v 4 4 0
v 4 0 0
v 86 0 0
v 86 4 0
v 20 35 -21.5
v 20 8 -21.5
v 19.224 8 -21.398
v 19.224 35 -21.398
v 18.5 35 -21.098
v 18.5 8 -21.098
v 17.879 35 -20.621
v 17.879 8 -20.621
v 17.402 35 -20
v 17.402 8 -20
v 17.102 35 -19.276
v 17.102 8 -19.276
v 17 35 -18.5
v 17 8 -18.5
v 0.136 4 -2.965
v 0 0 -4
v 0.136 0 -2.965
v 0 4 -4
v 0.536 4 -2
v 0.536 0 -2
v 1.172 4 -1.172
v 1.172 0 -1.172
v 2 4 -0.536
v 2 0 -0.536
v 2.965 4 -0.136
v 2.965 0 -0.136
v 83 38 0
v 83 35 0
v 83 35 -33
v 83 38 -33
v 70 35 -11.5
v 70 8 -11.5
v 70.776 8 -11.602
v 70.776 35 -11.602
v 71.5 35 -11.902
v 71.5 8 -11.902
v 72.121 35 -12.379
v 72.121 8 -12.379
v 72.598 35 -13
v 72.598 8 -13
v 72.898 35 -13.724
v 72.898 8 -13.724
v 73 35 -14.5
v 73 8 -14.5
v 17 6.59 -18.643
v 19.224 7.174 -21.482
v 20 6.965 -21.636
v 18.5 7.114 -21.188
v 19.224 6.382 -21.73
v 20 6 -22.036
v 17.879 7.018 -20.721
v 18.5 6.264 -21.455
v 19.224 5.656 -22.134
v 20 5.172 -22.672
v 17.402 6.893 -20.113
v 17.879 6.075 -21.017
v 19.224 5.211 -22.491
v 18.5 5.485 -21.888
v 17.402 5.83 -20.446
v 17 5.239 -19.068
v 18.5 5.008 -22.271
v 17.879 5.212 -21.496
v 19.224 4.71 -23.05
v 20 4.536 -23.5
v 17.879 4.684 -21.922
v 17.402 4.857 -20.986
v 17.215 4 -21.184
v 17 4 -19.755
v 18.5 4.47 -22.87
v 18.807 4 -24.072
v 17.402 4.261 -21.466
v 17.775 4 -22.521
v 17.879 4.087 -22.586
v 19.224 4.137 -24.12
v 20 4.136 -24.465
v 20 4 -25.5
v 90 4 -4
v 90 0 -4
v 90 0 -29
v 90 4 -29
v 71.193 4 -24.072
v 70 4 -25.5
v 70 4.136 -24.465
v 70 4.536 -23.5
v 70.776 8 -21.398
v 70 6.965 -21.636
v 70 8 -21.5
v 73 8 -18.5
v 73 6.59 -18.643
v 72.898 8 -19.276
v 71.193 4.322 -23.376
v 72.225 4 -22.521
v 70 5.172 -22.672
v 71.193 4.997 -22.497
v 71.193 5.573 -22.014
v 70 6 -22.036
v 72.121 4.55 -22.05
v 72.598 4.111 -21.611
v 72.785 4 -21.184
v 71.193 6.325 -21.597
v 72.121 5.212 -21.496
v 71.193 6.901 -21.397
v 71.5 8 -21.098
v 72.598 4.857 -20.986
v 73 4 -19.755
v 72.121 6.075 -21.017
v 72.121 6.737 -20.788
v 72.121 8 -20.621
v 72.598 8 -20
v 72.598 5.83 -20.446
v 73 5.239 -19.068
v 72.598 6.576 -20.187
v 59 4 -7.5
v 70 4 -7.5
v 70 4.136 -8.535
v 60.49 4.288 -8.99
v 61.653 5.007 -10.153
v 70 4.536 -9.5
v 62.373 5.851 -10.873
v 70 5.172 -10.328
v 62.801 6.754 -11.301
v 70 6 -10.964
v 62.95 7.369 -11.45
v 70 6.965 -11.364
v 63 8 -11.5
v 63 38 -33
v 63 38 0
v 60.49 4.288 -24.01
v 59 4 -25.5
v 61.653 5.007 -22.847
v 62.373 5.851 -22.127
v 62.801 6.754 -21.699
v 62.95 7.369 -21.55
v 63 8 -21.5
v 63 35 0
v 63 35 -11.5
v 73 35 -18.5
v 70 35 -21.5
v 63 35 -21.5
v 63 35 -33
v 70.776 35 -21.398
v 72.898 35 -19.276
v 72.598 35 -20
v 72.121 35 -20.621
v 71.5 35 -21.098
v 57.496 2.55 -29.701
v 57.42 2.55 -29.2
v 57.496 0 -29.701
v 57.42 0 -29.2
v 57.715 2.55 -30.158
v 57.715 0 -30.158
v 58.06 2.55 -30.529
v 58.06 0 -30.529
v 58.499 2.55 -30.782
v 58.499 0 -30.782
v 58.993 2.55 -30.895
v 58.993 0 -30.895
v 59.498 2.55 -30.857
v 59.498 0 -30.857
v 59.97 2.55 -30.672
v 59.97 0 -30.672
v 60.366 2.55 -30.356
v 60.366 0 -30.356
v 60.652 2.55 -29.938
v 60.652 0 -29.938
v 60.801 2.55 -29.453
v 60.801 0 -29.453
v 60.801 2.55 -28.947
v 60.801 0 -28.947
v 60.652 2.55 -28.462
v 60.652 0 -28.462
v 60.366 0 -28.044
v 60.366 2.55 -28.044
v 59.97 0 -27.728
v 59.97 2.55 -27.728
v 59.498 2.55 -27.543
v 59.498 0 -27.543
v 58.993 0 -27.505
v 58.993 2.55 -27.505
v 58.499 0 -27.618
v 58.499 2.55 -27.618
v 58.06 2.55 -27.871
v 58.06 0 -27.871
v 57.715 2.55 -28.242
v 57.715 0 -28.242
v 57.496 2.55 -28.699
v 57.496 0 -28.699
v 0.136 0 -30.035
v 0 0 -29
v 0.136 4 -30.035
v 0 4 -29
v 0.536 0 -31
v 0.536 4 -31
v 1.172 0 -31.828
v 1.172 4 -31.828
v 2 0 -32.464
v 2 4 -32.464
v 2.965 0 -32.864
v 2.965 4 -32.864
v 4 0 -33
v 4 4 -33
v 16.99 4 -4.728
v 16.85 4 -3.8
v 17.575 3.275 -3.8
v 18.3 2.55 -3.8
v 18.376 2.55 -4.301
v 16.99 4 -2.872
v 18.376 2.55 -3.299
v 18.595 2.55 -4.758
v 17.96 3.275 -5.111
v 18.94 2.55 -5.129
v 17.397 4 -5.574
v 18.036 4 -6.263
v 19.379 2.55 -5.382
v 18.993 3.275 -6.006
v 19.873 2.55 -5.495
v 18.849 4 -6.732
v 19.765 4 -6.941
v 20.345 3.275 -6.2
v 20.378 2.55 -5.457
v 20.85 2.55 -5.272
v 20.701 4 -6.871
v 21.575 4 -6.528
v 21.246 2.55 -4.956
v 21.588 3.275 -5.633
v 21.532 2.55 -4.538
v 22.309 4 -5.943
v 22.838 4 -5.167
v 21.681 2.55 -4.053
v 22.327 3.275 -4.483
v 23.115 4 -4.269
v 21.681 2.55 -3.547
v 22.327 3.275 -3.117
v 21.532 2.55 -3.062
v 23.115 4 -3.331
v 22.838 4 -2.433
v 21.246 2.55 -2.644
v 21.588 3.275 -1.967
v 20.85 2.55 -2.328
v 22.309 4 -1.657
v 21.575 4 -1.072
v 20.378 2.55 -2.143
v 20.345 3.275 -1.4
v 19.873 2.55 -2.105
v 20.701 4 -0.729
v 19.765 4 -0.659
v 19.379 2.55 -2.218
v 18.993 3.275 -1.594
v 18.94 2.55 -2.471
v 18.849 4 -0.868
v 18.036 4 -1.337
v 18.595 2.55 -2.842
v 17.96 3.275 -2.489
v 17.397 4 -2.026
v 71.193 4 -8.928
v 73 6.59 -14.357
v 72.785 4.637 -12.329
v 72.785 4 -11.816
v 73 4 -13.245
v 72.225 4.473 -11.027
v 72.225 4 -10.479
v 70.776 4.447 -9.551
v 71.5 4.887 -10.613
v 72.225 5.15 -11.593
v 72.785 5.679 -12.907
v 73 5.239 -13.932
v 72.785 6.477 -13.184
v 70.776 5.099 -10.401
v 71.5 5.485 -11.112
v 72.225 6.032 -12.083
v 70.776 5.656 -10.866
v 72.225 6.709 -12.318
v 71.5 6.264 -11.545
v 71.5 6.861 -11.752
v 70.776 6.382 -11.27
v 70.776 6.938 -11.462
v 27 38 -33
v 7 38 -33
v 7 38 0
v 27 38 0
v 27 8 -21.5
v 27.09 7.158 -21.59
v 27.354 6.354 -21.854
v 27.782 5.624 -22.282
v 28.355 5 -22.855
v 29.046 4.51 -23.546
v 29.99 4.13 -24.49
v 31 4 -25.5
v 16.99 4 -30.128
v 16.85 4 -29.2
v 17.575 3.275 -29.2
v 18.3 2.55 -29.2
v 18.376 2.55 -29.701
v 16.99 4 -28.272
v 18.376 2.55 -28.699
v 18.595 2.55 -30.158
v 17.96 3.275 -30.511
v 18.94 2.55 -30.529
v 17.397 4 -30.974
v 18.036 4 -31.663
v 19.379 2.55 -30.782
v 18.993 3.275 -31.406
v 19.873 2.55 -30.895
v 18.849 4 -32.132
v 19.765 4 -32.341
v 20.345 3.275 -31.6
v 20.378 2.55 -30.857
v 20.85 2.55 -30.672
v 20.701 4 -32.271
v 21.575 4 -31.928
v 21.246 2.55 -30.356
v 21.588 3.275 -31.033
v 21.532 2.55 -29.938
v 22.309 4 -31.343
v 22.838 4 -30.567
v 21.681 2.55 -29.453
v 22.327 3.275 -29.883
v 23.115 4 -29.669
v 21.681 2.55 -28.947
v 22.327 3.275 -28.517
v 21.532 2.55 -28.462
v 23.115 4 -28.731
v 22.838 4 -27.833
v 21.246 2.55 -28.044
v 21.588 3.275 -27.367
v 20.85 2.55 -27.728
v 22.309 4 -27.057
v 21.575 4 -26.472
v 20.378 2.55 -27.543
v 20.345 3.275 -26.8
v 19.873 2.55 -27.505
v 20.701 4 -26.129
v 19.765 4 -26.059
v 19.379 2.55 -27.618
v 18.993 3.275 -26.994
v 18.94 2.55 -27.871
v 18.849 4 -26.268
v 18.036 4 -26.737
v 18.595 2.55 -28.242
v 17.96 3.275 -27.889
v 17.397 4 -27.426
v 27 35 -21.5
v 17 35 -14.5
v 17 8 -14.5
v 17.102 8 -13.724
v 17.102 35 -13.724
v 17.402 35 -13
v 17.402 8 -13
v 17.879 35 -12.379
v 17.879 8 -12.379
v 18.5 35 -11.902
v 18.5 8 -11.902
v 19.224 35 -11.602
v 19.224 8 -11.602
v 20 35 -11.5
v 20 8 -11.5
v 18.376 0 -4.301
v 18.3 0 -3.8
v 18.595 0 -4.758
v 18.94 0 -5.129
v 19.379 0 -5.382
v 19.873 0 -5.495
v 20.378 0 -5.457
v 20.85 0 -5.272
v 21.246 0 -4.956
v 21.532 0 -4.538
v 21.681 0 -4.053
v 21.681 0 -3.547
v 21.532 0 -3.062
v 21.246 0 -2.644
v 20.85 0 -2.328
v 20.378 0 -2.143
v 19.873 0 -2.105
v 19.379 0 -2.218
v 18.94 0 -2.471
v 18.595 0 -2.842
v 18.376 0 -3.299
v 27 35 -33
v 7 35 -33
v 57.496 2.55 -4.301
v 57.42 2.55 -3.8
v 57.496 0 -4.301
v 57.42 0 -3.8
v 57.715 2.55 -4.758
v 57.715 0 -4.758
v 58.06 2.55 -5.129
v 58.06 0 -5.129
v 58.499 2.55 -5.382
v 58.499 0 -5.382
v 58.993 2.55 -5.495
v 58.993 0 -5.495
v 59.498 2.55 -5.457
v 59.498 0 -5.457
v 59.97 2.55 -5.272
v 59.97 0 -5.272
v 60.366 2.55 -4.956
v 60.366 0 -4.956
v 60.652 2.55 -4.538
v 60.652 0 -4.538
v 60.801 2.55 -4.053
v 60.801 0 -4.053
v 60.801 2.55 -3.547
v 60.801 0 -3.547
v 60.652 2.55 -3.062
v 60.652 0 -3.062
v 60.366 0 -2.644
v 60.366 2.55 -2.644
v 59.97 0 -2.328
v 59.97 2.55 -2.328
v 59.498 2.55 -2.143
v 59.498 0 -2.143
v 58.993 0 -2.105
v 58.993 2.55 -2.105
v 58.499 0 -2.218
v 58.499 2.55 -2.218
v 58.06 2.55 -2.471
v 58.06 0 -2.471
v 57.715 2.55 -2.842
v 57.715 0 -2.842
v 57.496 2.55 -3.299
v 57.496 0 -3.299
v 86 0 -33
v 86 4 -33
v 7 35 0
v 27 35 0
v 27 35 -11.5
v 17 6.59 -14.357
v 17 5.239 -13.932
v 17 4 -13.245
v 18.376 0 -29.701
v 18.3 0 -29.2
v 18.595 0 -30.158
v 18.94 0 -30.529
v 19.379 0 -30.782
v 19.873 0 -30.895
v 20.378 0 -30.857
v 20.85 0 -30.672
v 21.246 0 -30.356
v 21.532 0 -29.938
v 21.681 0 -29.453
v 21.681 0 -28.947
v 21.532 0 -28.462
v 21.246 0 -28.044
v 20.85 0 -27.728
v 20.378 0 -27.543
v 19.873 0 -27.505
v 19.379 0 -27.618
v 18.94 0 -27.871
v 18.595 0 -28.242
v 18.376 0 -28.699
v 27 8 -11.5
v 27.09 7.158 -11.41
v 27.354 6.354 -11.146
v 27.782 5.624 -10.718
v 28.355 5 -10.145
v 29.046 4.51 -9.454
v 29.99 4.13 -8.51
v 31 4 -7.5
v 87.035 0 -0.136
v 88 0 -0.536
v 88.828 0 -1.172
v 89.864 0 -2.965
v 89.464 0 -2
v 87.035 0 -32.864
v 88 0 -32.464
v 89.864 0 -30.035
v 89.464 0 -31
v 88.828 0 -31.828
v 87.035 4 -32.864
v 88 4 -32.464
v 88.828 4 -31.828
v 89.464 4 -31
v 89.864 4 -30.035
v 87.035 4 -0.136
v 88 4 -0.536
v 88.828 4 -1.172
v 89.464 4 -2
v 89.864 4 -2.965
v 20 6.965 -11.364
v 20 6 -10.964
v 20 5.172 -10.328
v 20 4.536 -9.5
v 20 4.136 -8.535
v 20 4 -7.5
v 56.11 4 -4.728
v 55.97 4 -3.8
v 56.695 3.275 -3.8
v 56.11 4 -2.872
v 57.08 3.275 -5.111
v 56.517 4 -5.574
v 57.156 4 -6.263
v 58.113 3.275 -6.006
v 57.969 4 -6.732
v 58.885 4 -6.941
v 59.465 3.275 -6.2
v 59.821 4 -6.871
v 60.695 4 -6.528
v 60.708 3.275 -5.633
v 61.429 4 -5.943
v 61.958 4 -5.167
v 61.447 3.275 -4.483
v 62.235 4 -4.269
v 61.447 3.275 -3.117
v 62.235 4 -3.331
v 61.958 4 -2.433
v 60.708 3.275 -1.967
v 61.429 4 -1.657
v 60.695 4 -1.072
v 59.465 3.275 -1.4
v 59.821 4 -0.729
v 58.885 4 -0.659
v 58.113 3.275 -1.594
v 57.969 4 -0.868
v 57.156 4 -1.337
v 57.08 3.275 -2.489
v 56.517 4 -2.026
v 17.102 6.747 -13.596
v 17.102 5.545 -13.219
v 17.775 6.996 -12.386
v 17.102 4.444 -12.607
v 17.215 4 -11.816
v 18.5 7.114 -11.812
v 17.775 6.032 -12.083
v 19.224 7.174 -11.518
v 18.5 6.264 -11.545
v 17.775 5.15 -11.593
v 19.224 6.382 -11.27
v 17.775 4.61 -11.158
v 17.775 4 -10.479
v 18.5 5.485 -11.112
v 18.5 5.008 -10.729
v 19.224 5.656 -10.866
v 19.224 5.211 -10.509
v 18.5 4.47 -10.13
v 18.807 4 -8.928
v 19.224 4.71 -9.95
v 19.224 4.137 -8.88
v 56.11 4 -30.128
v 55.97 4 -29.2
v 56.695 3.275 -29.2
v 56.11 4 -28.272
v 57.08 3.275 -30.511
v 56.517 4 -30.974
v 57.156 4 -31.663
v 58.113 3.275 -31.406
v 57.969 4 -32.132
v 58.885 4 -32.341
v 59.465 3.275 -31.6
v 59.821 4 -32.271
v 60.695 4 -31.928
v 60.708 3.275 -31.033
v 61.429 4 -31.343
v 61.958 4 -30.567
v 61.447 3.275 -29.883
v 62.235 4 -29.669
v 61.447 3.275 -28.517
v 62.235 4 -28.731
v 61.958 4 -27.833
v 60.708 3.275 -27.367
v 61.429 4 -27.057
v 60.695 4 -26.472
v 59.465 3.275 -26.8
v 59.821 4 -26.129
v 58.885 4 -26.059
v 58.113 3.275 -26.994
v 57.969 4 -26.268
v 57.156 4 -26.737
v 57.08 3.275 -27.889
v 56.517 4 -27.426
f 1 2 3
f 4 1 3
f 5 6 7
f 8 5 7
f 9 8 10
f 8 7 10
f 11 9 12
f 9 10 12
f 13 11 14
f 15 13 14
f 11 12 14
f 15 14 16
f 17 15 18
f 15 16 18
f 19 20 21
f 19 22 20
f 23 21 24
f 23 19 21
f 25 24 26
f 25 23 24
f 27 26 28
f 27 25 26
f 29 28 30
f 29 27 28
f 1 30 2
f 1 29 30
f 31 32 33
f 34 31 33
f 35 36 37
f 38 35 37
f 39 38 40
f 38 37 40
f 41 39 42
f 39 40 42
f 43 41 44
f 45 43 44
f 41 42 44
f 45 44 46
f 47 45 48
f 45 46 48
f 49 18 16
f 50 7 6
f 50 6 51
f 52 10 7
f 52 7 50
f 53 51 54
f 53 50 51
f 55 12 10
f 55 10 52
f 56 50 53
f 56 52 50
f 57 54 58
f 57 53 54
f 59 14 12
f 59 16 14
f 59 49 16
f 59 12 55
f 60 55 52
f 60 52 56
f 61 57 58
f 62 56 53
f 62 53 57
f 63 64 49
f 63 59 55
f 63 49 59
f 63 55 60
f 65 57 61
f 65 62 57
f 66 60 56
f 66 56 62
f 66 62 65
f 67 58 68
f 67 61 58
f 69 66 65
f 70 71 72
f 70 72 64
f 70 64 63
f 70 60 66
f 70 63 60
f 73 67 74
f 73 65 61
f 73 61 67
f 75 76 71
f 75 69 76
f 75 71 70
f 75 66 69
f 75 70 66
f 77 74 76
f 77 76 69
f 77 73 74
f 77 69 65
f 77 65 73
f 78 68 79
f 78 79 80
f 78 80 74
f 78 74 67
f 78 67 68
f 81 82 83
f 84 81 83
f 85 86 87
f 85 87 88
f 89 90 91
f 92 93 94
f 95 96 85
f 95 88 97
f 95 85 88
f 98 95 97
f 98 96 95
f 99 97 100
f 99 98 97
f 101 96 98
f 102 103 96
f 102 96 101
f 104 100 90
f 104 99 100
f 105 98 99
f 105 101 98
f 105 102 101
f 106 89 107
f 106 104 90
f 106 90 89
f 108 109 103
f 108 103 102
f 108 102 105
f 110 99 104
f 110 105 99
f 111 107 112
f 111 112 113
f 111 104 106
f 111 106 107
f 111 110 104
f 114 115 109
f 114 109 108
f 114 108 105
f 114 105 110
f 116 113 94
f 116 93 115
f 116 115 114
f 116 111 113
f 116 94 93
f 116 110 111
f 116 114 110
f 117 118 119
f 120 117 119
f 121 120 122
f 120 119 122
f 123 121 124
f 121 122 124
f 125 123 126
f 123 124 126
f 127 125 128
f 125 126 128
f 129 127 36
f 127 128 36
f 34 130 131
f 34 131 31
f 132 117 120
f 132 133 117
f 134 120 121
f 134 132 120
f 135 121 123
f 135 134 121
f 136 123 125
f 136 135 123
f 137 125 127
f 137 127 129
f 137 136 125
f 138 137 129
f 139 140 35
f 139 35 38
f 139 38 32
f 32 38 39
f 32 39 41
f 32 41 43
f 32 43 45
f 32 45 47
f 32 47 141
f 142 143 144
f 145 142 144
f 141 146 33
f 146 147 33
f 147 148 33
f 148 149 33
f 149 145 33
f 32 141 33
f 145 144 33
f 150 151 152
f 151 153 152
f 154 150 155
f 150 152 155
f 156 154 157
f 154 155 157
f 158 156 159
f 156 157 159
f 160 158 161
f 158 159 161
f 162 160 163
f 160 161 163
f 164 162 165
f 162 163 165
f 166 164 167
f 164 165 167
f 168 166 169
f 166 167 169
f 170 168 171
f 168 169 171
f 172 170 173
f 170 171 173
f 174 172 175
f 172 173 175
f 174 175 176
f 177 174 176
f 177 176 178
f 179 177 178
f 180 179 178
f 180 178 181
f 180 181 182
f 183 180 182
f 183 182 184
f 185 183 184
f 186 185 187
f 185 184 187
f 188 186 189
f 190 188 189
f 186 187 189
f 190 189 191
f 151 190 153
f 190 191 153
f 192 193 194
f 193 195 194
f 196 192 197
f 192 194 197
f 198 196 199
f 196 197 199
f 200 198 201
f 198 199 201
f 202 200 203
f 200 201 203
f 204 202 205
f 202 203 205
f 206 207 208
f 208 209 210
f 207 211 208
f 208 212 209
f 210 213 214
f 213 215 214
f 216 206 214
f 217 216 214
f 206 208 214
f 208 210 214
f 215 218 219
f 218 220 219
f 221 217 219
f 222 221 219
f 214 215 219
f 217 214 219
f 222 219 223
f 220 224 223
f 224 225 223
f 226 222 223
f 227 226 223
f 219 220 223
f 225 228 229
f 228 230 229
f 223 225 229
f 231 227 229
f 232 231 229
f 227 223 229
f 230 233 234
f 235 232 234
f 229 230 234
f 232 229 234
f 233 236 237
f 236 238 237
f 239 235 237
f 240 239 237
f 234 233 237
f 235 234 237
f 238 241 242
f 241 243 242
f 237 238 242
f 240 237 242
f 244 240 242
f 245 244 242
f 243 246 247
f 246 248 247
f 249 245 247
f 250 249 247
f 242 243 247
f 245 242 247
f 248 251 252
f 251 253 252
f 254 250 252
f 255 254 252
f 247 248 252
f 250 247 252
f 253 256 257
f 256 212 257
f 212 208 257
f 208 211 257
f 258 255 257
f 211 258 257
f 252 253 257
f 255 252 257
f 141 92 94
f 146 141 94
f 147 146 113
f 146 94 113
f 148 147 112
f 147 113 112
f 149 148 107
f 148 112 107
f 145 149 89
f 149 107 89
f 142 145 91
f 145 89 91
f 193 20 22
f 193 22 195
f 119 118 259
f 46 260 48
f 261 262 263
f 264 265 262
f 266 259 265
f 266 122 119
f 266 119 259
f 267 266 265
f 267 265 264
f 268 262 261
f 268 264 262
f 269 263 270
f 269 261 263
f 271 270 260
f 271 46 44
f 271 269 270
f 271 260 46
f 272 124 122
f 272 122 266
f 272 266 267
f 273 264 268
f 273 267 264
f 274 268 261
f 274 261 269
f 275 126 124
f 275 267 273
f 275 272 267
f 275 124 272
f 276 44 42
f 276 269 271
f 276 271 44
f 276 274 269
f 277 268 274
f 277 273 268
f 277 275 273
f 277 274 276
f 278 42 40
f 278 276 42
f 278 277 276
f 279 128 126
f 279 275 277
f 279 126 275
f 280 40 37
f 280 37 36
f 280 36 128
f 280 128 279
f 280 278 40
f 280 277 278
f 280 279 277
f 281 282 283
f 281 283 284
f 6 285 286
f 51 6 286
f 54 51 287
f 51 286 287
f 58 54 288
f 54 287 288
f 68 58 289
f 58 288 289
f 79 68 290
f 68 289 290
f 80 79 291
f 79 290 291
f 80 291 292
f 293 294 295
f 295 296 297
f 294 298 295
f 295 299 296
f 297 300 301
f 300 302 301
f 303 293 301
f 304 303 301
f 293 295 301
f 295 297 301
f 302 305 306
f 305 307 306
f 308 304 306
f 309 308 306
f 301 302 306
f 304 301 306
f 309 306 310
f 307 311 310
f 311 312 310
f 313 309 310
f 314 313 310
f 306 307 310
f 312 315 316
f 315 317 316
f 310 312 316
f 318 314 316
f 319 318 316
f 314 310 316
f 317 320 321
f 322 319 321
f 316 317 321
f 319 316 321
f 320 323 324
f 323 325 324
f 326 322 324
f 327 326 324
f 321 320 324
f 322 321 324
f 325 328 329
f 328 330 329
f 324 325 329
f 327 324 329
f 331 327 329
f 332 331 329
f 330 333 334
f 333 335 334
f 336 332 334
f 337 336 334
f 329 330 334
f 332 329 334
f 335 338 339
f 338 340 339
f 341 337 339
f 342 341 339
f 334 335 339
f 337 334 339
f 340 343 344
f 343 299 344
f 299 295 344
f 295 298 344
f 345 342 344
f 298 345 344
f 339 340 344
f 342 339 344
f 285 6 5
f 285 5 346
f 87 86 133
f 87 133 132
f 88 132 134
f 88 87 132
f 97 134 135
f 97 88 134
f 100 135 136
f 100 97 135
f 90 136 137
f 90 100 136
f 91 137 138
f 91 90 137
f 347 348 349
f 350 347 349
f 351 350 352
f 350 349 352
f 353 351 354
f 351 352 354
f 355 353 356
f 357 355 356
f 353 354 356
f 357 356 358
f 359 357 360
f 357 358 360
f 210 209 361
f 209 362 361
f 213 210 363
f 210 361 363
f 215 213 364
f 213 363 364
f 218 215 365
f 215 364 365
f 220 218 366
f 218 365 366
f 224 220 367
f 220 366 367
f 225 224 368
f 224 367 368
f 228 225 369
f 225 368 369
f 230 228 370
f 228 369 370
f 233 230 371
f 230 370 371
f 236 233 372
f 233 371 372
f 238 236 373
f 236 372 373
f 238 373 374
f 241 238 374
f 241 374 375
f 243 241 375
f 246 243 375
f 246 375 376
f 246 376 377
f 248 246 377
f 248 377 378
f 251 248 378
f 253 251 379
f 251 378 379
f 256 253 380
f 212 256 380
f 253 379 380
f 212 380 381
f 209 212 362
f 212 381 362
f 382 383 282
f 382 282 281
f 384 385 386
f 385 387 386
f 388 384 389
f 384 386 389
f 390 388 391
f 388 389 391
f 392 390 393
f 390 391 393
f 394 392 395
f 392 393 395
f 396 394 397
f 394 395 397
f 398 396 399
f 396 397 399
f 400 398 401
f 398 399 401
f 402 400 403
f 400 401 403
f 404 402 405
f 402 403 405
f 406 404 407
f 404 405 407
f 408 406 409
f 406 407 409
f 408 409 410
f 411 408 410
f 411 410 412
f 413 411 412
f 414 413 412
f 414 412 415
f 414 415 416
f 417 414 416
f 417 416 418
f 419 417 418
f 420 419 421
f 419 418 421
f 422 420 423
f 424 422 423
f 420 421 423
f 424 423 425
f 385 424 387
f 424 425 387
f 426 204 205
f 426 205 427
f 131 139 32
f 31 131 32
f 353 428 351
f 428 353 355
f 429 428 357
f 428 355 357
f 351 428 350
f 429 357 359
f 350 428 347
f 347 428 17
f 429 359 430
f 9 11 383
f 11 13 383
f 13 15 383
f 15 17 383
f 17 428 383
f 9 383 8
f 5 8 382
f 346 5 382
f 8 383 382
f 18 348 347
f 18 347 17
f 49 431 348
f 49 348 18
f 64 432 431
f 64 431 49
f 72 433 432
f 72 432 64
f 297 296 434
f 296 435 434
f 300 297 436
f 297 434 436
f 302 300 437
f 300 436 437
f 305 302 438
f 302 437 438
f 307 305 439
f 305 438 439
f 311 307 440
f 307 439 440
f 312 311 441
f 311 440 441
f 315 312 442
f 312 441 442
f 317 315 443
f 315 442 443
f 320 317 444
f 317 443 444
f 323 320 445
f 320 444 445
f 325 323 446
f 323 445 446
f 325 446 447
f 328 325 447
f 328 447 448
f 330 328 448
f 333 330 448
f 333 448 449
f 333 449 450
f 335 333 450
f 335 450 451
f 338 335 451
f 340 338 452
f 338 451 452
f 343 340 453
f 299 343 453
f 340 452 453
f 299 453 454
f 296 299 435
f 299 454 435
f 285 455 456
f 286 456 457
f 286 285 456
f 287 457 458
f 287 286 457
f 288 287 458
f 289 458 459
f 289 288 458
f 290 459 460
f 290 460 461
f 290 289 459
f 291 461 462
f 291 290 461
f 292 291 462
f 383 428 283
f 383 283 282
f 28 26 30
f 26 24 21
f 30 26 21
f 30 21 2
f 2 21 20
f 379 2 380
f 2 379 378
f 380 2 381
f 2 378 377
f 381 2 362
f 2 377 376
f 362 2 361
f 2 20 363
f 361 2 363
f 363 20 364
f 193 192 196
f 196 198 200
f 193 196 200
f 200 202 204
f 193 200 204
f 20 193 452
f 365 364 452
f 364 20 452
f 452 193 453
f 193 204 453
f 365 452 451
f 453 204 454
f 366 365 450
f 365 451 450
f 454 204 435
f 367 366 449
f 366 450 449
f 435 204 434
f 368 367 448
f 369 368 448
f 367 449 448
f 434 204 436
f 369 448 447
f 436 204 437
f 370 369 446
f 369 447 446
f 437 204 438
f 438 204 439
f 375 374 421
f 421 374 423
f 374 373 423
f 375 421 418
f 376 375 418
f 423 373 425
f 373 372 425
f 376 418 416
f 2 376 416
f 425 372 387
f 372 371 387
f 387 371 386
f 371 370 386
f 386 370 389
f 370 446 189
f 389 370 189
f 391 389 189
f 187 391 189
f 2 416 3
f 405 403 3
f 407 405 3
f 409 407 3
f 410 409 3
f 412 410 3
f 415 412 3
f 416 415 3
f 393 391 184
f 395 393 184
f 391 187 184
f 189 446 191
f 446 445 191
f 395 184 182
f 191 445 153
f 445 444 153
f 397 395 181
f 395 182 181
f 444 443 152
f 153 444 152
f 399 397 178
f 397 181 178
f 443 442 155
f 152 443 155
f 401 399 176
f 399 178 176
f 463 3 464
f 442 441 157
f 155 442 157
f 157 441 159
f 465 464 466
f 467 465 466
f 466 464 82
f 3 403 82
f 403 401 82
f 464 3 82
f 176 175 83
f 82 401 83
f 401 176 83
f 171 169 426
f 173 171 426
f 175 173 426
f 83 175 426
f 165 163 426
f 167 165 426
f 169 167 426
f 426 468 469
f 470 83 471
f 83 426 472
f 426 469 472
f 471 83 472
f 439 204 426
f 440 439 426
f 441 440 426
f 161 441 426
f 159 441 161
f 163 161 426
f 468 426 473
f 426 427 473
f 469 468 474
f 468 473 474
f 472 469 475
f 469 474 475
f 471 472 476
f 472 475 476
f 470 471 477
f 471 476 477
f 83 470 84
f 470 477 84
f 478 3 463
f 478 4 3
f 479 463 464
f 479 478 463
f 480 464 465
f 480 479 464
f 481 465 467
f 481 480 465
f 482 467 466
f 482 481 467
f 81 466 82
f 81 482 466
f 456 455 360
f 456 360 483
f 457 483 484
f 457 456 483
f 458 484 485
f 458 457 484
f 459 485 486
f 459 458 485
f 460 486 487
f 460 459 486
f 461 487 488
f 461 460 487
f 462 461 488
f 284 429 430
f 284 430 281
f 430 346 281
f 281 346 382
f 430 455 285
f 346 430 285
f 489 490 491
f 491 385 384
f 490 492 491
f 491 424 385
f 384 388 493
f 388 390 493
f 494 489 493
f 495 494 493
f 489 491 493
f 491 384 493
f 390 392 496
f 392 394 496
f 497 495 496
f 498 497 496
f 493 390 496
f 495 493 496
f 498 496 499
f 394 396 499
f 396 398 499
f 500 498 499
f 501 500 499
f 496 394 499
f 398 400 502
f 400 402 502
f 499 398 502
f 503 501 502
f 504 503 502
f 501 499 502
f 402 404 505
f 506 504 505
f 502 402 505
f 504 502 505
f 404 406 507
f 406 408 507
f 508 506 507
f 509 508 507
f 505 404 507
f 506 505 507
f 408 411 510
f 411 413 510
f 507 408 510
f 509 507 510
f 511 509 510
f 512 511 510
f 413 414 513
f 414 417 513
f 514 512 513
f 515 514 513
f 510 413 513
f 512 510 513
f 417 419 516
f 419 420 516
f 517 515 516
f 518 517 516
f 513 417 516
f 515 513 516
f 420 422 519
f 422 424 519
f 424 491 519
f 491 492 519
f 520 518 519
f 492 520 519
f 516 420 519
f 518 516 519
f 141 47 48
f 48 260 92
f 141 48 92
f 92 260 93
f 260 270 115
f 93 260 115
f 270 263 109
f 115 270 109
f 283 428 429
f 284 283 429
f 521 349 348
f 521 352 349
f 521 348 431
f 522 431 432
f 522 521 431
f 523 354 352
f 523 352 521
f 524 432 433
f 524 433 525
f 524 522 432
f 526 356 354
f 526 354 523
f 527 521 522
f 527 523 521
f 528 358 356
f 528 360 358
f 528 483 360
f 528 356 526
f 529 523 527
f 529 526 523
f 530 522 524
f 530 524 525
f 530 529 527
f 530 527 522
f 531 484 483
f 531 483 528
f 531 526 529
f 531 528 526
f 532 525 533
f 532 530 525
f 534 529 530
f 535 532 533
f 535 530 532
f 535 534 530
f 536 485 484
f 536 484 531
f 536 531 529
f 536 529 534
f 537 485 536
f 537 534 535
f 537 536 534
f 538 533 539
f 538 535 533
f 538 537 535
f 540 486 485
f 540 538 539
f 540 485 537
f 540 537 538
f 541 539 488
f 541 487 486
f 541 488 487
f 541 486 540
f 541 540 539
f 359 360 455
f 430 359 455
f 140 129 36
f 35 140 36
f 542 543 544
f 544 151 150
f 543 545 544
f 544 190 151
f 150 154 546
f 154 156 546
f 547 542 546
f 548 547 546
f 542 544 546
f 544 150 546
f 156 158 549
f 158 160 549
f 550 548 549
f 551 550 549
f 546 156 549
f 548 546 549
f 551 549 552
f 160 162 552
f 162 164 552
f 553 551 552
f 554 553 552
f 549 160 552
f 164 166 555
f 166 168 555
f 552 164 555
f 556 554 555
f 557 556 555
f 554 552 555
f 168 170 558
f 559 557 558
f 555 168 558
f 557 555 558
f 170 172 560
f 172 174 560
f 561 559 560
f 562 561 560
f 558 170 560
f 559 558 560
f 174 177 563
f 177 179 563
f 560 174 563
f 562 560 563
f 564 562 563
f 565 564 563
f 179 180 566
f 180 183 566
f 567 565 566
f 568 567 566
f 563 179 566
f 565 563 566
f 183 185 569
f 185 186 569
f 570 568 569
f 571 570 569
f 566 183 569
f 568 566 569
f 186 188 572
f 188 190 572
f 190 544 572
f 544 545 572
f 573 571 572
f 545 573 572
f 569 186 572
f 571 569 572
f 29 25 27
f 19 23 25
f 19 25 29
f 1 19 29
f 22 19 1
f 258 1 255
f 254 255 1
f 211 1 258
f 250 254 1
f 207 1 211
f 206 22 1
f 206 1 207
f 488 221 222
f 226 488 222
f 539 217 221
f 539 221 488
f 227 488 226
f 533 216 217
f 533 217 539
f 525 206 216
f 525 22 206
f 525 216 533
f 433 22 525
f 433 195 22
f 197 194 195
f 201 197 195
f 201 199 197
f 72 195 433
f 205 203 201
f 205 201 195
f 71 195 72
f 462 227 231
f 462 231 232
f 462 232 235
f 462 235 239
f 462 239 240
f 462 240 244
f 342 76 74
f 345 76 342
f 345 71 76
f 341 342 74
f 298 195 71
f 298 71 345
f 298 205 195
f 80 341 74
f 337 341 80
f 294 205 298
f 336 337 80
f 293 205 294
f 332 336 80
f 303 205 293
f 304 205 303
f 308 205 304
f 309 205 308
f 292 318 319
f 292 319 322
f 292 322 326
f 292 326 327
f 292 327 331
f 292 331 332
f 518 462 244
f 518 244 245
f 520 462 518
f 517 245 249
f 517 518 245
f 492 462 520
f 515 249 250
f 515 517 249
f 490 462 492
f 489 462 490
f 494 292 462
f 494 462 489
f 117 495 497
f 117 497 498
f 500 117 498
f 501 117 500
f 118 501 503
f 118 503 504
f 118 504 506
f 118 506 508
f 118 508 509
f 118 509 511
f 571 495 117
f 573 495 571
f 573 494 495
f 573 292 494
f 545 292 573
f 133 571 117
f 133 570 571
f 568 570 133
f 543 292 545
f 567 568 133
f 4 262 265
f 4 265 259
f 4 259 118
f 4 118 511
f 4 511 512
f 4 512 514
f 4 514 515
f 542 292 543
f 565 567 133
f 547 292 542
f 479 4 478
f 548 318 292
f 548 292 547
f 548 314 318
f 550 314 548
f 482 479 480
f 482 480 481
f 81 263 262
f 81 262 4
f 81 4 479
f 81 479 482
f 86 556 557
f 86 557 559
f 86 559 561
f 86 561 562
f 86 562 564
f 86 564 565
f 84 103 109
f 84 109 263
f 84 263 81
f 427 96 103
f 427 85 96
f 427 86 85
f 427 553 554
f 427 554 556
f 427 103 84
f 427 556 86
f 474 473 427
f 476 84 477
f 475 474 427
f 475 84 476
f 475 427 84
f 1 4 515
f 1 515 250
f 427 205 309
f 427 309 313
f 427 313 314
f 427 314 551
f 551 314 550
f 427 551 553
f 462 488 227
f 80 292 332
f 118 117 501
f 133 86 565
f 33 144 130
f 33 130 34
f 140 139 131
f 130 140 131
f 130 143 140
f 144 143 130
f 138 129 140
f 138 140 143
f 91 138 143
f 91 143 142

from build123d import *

# Parameters (mm, degrees)
ESQUISSE1_W                                    = 90
ESQUISSE1_H                                    = 33
BOSS_EXTRU_1_DEPTH                             = 4
ESQUISSE2_R                                    = 1.5
ENL_V_MAT_EXTRU_1_DEPTH                        = 4
ESQUISSE3_W                                    = 10
ESQUISSE3_H                                    = 10
BOSS_EXTRU_2_DEPTH                             = 31
ESQUISSE4_W                                    = 20
ESQUISSE4_H                                    = 33
BOSS_EXTRU_3_DEPTH                             = 3
CONG_1_R                                       = 4
FRAISAGE_POUR_VIS_T_TE_FRAIS_E_M31_D           = 3.4
FRAISAGE_POUR_VIS_T_TE_FRAIS_E_M31_DEPTH       = 10
FRAISAGE_POUR_VIS_T_TE_FRAIS_E_M31_CSINK_D     = 6.3
FRAISAGE_POUR_VIS_T_TE_FRAIS_E_M31_CSINK_ANGLE = 90
FRAISAGE_POUR_VIS_T_TE_FRAIS_E_M31_TIP         = 1.021463052
CONG_2_R                                       = 3


with BuildPart() as part:
    # Esquisse1 → Boss.-Extru.1 (new body)
    with BuildSketch(Plane(origin=(0, 0, 0), x_dir=(1, 0, 0), z_dir=(0, 1, 0))):
        with Locations((45, 16.5)):
            Rectangle(ESQUISSE1_W, ESQUISSE1_H)
    extrude(amount=BOSS_EXTRU_1_DEPTH)

    # Esquisse2 → Enlèv. mat.-Extru.1 (cut)
    with BuildSketch(Plane(origin=(0, 4, 0), x_dir=(1, 0, 0), z_dir=(0, 1, 0))):
        with Locations(Location((20, 29.2, 0), (0, 0, 270))):
            Circle(ESQUISSE2_R)
        with Locations(Location((59.12, 29.2, 0), (0, 0, 270))):
            Circle(ESQUISSE2_R)
        with Locations(Location((59.12, 3.8, 0), (0, 0, 270))):
            Circle(ESQUISSE2_R)
        with Locations(Location((20, 3.8, 0), (0, 0, 270))):
            Circle(ESQUISSE2_R)
    extrude(amount=-ENL_V_MAT_EXTRU_1_DEPTH, mode=Mode.SUBTRACT)

    # Esquisse3 → Boss.-Extru.2 (add)
    with BuildSketch(Plane(origin=(0, 4, 0), x_dir=(1, 0, 0), z_dir=(0, 1, 0))):
        with Locations((22, 16.5)):
            Rectangle(ESQUISSE3_W, ESQUISSE3_H)
        with Locations((68, 16.5)):
            Rectangle(ESQUISSE3_W, ESQUISSE3_H)
    extrude(amount=BOSS_EXTRU_2_DEPTH)

    # Esquisse4 → Boss.-Extru.3 (add)
    with BuildSketch(Plane(origin=(0, 35, 0), x_dir=(1, 0, 0), z_dir=(0, 1, 0))):
        with Locations((17, 16.5)):
            Rectangle(ESQUISSE4_W, ESQUISSE4_H)
        with Locations((73, 16.5)):
            Rectangle(ESQUISSE4_W, ESQUISSE4_H)
    extrude(amount=BOSS_EXTRU_3_DEPTH)

    # Congé1
    cong_1_edges = [part.edges().sort_by_distance(p)[0] for p in [
        (22, 4, -11.5),
        (27, 4, -16.5),
        (22, 4, -21.5),
        (63, 4, -16.5),
        (68, 4, -11.5),
        (68, 4, -21.5),
        (0, 2, -33),
        (90, 2, -33),
        (90, 2, 0),
        (0, 2, 0),
    ]]
    fillet(cong_1_edges, radius=CONG_1_R)

    # Fraisage pour vis à tête fraisée M31
    with Locations(Plane(origin=(0, 4, 0), x_dir=(1, 0, 0), z_dir=(0, 1, 0))):
        with Locations((59.12, 3.8), (59.12, 29.2), (20, 3.8), (20, 29.2)):
            CounterSinkHole(FRAISAGE_POUR_VIS_T_TE_FRAIS_E_M31_D / 2, FRAISAGE_POUR_VIS_T_TE_FRAIS_E_M31_CSINK_D / 2, depth=FRAISAGE_POUR_VIS_T_TE_FRAIS_E_M31_DEPTH, counter_sink_angle=FRAISAGE_POUR_VIS_T_TE_FRAIS_E_M31_CSINK_ANGLE)
            with Locations((0, 0, -(FRAISAGE_POUR_VIS_T_TE_FRAIS_E_M31_DEPTH + FRAISAGE_POUR_VIS_T_TE_FRAIS_E_M31_TIP / 2))):  # 118° drill point
                Cone(0, FRAISAGE_POUR_VIS_T_TE_FRAIS_E_M31_D / 2, FRAISAGE_POUR_VIS_T_TE_FRAIS_E_M31_TIP, mode=Mode.SUBTRACT)

    # Congé2
    # the kernel refuses this fillet: 3 mm, written as the material it takes off along each edge
    with BuildSketch(Plane(origin=(17, 8, -25.5), x_dir=(0, 0, 1), z_dir=(0, 1, 0))) as cong_2_piece_1_section:
        with BuildLine():
            CenterArc((4 + CONG_2_R, CONG_2_R), CONG_2_R, 180, 90)
            Line((4, CONG_2_R), (4, 0))
            Line((4, 0), (4 + CONG_2_R, 0))
        make_face()
    cong_2_piece_1 = revolve(axis=Axis((17, 8, -25.5), (1, 0, 0)), revolution_arc=197.472741928, mode=Mode.PRIVATE)
    cong_2_piece_1 = split(cong_2_piece_1, bisect_by=Plane(origin=(17, 4, -25.5), z_dir=(0, 1, 0)), keep=Keep.TOP, mode=Mode.PRIVATE)
    add(cong_2_piece_1, mode=Mode.SUBTRACT)
    with BuildSketch(Plane(origin=(73, 8, -25.5), x_dir=(0, 0.3002520412299313, -0.9538599015249879), z_dir=(0, 0.9538599015249879, 0.3002520412299313))) as cong_2_piece_2_section:
        with BuildLine():
            CenterArc((4 + CONG_2_R, CONG_2_R), CONG_2_R, 180, 90)
            Line((4, CONG_2_R), (4, 0))
            Line((4, 0), (4 + CONG_2_R, 0))
        make_face()
    cong_2_piece_2 = revolve(axis=Axis((73, 8, -25.5), (-1, 0, 0)), revolution_arc=197.472741928, mode=Mode.PRIVATE)
    cong_2_piece_2 = split(cong_2_piece_2, bisect_by=Plane(origin=(73, 4, -25.5), z_dir=(0, 1, 0)), keep=Keep.TOP, mode=Mode.PRIVATE)
    add(cong_2_piece_2, mode=Mode.SUBTRACT)
    with BuildSketch(Plane(origin=(73, 8, -7.5), x_dir=(0, 0.30025204122993077, 0.9538599015249881), z_dir=(0, 0.9538599015249881, -0.30025204122993077))) as cong_2_piece_3_section:
        with BuildLine():
            CenterArc((4 + CONG_2_R, -CONG_2_R), CONG_2_R, 90, 90)
            Line((4, -CONG_2_R), (4, 0))
            Line((4, 0), (4 + CONG_2_R, 0))
        make_face()
    cong_2_piece_3 = revolve(axis=Axis((73, 8, -7.5), (1, 0, 0)), revolution_arc=197.472741928, mode=Mode.PRIVATE)
    cong_2_piece_3 = split(cong_2_piece_3, bisect_by=Plane(origin=(73, 4, -7.5), z_dir=(0, 1, 0)), keep=Keep.TOP, mode=Mode.PRIVATE)
    add(cong_2_piece_3, mode=Mode.SUBTRACT)
    with BuildSketch(Plane(origin=(17, 8, -7.5), x_dir=(0, 0, -1), z_dir=(0, 1, 0))) as cong_2_piece_4_section:
        with BuildLine():
            CenterArc((4 + CONG_2_R, -CONG_2_R), CONG_2_R, 90, 90)
            Line((4, -CONG_2_R), (4, 0))
            Line((4, 0), (4 + CONG_2_R, 0))
        make_face()
    cong_2_piece_4 = revolve(axis=Axis((17, 8, -7.5), (-1, 0, 0)), revolution_arc=197.472741928, mode=Mode.PRIVATE)
    cong_2_piece_4 = split(cong_2_piece_4, bisect_by=Plane(origin=(17, 4, -7.5), z_dir=(0, 1, 0)), keep=Keep.TOP, mode=Mode.PRIVATE)
    add(cong_2_piece_4, mode=Mode.SUBTRACT)
    with BuildSketch(Plane(origin=(17, 8, -21.5), x_dir=(0, 0, 1), z_dir=(0, 1, 0)), Plane(origin=(17, 8, -11.5), x_dir=(1, 0, 0), z_dir=(0, 1, 0)), Plane(origin=(73, 8, -11.5), x_dir=(0, 0, -1), z_dir=(0, 1, 0))) as cong_2_piece_5:
        with BuildLine():
            CenterArc((CONG_2_R, CONG_2_R), CONG_2_R, 180, 90)
            Line((0, CONG_2_R), (0, 0))
            Line((0, 0), (CONG_2_R, 0))
        make_face()
    extrude(amount=27, mode=Mode.SUBTRACT)
    with BuildSketch(Plane(origin=(73, 8, -21.5), x_dir=(0, 0, 1), z_dir=(0, 1, 0))) as cong_2_piece_6:
        with BuildLine():
            CenterArc((CONG_2_R, -CONG_2_R), CONG_2_R, 90, 90)
            Line((0, -CONG_2_R), (0, 0))
            Line((0, 0), (CONG_2_R, 0))
        make_face()
    extrude(amount=27, mode=Mode.SUBTRACT)


solid = part.part
